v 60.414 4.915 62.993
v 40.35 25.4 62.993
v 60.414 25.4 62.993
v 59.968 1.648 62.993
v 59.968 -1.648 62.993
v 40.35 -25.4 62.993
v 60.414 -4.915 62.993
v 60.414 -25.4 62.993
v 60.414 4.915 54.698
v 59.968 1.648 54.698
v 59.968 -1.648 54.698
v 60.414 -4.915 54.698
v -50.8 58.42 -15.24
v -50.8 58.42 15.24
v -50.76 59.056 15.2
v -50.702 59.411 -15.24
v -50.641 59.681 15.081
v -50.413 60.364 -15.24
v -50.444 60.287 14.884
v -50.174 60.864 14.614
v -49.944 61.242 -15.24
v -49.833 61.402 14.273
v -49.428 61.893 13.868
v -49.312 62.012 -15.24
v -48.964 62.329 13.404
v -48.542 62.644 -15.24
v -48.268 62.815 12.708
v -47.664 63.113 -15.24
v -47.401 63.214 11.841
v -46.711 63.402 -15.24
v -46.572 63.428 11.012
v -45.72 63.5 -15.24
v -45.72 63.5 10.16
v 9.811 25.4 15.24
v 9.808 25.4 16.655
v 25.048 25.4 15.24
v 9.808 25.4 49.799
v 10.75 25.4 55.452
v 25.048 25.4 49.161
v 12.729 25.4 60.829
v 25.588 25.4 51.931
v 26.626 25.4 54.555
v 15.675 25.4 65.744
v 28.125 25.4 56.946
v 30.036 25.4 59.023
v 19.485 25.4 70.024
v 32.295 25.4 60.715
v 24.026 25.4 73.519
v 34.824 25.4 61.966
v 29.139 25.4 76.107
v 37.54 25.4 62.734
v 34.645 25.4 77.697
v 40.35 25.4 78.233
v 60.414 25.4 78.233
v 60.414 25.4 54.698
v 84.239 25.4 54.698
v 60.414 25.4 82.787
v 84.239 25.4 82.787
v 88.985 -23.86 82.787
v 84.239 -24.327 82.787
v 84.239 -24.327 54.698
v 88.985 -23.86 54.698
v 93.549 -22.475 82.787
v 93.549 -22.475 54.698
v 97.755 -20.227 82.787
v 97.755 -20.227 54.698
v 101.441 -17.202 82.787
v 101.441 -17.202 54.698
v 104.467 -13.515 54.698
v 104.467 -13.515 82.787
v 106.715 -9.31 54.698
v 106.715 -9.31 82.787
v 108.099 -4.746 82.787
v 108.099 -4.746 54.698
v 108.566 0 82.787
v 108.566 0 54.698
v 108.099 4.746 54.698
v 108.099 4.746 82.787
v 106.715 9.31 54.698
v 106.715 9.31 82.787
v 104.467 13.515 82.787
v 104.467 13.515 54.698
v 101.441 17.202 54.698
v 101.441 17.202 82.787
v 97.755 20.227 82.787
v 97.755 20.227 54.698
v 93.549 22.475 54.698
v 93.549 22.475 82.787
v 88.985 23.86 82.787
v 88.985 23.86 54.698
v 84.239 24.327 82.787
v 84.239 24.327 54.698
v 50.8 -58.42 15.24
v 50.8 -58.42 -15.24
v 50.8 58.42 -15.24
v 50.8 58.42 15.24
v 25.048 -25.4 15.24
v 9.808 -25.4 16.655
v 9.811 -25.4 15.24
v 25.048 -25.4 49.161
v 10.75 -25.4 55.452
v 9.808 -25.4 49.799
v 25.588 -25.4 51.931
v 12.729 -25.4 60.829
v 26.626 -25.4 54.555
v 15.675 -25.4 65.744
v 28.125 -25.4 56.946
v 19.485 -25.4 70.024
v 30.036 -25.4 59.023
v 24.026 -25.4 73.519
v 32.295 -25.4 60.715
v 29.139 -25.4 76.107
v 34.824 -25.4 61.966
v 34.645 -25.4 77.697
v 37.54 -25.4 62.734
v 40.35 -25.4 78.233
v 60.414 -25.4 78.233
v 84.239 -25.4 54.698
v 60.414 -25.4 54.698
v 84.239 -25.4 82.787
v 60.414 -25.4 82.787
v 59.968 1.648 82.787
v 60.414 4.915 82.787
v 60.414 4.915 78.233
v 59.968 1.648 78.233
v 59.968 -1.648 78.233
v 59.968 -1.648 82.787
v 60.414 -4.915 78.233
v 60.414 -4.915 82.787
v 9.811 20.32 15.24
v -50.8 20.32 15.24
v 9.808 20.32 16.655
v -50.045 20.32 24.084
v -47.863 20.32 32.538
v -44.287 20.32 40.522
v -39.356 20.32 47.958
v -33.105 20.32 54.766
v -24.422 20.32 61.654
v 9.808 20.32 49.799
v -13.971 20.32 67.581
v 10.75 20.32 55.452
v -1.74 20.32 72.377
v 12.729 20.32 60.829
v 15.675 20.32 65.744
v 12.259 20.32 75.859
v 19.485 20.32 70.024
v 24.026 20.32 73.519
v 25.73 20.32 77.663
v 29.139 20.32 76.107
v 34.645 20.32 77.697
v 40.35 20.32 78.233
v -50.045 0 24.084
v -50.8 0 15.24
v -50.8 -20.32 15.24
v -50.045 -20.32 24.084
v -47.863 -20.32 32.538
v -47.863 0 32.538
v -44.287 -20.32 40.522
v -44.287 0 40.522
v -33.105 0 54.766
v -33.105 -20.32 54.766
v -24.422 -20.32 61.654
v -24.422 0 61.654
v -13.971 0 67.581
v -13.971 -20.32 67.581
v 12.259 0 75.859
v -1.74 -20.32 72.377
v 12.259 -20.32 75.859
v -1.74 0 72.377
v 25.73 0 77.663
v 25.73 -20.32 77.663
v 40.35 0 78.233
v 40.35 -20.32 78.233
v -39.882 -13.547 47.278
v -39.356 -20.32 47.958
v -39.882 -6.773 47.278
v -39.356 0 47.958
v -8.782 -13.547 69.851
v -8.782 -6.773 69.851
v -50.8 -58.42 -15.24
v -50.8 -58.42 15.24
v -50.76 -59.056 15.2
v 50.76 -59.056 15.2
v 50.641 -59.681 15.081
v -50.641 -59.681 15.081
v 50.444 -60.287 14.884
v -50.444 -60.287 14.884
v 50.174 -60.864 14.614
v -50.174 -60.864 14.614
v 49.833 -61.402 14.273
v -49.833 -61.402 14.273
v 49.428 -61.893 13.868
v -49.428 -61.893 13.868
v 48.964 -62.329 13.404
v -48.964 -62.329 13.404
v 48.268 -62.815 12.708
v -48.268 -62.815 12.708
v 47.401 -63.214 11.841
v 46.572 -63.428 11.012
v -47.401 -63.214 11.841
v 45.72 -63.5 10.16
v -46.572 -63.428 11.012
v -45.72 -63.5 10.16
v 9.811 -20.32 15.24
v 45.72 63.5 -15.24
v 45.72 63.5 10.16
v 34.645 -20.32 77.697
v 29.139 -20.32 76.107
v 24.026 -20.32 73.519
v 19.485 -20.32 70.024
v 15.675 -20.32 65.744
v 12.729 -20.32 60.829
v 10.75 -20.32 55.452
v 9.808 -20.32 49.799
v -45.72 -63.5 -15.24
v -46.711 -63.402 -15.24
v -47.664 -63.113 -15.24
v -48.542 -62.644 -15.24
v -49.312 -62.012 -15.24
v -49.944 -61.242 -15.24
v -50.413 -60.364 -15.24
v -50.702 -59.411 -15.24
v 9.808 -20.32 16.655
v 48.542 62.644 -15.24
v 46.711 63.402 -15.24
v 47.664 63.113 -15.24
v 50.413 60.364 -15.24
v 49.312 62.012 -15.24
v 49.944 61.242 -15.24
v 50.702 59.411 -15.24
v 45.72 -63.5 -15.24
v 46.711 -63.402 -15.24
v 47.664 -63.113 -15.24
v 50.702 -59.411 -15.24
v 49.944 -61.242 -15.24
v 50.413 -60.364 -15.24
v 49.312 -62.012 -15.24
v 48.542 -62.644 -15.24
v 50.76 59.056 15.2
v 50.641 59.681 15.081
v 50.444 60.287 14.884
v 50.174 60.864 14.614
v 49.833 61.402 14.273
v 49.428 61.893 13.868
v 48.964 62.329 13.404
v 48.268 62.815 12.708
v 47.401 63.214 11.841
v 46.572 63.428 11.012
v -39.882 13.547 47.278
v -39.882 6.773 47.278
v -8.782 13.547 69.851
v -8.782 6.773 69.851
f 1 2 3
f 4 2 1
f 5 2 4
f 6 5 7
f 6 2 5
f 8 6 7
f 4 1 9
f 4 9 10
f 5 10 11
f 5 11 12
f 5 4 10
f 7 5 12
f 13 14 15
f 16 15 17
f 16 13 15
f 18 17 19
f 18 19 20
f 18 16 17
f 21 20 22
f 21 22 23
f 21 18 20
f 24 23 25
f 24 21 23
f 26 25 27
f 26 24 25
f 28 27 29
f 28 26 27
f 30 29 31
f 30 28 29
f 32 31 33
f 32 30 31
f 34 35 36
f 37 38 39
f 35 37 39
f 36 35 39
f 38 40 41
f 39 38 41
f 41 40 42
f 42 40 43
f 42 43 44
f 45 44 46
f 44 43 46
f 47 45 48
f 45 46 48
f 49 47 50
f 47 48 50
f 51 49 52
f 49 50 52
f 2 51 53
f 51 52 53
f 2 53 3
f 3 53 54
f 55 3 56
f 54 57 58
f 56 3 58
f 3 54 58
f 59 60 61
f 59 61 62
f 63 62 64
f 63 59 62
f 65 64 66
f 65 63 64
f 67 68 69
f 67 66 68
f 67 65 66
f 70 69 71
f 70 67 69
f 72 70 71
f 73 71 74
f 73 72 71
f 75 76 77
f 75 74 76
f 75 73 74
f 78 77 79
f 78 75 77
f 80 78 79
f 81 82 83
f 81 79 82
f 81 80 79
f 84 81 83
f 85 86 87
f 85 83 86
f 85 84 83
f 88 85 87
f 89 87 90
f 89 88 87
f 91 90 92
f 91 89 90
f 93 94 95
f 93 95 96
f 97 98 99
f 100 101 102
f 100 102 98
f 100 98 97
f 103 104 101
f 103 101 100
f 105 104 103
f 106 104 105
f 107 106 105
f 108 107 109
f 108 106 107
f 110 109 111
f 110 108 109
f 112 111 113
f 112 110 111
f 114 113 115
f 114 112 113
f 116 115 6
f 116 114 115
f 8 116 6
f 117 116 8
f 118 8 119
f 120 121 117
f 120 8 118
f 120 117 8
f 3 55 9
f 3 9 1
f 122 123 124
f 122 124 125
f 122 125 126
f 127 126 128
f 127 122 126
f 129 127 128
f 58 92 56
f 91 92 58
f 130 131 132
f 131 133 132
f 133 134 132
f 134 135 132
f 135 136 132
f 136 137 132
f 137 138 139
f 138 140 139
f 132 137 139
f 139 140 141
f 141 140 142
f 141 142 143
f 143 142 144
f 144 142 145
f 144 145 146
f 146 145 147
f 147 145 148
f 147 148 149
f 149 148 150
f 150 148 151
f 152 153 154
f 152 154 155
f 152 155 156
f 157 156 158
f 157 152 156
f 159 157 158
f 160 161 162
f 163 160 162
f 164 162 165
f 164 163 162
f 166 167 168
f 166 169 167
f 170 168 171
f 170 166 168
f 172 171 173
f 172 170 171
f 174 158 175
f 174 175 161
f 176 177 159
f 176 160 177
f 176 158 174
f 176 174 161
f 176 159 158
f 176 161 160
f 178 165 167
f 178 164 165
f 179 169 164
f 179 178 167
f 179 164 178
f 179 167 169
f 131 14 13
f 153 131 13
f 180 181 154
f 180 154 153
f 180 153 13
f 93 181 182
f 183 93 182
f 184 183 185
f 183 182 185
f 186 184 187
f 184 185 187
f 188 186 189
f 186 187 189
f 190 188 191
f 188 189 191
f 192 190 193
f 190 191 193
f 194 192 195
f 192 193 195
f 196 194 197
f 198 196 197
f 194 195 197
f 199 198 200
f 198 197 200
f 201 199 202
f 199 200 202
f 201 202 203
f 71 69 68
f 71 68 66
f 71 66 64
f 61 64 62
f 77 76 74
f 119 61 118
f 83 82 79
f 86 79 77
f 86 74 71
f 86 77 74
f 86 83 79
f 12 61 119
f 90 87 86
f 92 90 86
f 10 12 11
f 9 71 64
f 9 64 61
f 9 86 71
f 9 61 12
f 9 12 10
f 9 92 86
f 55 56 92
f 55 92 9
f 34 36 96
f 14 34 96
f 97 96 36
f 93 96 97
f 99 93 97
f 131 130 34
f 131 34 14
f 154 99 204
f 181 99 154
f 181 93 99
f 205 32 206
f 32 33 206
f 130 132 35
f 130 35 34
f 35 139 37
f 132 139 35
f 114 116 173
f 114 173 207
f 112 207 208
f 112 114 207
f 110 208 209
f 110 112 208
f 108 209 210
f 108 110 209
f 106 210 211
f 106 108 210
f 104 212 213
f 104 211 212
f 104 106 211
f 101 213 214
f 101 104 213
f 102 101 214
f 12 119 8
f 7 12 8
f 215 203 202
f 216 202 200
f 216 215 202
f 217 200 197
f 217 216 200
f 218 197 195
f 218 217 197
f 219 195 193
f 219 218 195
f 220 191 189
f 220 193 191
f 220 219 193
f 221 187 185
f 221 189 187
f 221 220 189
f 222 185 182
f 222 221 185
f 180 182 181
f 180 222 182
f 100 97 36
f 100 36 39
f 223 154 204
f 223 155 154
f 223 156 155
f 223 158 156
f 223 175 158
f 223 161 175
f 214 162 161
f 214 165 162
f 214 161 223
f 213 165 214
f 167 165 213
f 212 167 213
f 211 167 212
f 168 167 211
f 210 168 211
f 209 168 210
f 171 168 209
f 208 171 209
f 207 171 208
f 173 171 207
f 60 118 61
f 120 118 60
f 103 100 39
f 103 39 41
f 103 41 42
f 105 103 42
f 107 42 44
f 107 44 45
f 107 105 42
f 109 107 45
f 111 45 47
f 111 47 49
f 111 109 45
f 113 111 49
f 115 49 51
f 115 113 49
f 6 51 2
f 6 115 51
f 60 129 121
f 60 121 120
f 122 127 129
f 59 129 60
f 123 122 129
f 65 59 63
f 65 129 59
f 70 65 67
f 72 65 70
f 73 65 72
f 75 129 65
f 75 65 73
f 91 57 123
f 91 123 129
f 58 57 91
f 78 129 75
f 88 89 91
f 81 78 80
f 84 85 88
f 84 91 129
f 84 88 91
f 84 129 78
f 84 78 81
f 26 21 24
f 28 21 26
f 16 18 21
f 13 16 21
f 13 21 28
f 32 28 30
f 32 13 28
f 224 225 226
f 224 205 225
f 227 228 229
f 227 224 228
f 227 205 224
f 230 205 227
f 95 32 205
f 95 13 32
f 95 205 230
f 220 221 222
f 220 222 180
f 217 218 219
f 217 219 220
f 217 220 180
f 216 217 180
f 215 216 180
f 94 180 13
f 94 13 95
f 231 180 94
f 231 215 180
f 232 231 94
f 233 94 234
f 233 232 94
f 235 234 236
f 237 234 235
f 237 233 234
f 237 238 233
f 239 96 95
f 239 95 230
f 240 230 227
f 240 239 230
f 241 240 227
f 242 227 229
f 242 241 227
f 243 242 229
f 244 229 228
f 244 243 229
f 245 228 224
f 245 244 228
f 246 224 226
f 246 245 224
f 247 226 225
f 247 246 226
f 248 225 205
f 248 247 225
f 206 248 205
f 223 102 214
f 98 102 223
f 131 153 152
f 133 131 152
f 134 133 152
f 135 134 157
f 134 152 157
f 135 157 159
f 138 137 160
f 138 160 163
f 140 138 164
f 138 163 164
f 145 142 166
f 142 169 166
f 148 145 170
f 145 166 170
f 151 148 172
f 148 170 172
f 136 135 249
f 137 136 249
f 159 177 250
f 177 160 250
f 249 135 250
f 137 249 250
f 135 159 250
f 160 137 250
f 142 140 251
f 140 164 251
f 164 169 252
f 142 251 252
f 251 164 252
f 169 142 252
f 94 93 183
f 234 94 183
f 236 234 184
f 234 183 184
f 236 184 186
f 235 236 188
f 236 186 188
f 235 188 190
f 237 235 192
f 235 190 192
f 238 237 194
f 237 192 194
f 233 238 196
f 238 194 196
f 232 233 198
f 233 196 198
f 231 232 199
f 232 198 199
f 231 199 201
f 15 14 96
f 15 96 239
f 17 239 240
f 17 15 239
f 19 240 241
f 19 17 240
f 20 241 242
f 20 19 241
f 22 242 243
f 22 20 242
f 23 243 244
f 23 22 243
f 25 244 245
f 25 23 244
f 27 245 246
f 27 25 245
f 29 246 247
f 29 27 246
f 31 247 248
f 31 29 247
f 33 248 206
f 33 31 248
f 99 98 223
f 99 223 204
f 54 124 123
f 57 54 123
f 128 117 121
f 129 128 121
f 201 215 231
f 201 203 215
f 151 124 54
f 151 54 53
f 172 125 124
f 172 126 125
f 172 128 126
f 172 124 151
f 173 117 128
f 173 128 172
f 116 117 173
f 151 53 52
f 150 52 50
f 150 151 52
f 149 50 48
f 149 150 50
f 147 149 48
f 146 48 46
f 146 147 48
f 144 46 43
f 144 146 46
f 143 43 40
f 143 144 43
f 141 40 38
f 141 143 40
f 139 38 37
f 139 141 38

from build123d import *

# Parameters (mm, degrees)
F1_DEPTH = 63.5
F2_R     = 5.08
F0_W     = 23.8256007433
F0_H     = 15.24
F0_H_2   = 4.5536607504
F0_H_3   = 8.295490036
F3_DEPTH = 25.4
F4_DEPTH = 20.32


with BuildPart() as f1:
    # F0 (on Front) → F1 (new body, symmetric)
    with BuildSketch(Plane.XZ):
        Polygon((50.8, 15.24), (25.0475049125, 15.24), (9.811083613, 15.24), (-50.8, 15.24), (-50.8, -15.24), (50.8, -15.24), align=None)
    extrude(amount=F1_DEPTH, both=True)

    # F2
    f2_edges = [f1.edges().sort_by_distance(p)[0] for p in [
        (0, -63.5, 15.24),
        (50.8, -63.5, 0),
        (50.8, 63.5, 0),
        (-50.8, -63.5, 0),
        (-50.8, 63.5, 0),
        (0, 63.5, 15.24),
    ]]
    fillet(f2_edges, radius=F2_R)

    # F0 (on Front) → F3 (join, symmetric)
    with BuildSketch(Plane.XZ):
        with BuildLine():
            Line((9.811083613, 15.24), (25.0475049125, 15.24))
            Line((25.0475049125, 15.24), (25.0475049125, 49.1612727198))
            ThreePointArc((25.0475049125, 49.1612727198), (30.0363393946, 59.0226161714), (40.349945426, 62.9930185175))
            Line((40.349945426, 62.9930185175), (60.413621366, 62.9930185175))
            Line((60.413621366, 62.9930185175), (60.413621366, 78.2330185175))
            Line((60.413621366, 78.2330185175), (40.349945426, 78.2330185175))
            ThreePointArc((40.349945426, 78.2330185175), (19.4853705585, 70.0242707851), (9.8075049125, 49.7992135472))
            Line((9.8075049125, 49.7992135472), (9.8075049125, 16.6551610548))
            Line((9.8075049125, 16.6551610548), (9.811083613, 15.24))
        make_face()
        with Locations((72.3264217377, 70.6130185175)):
            Rectangle(F0_W, F0_H)
        with Locations((72.3264217377, 80.5098488927)):
            Rectangle(F0_W, F0_H_2)
        with Locations((72.3264217377, 58.8452734995)):
            Rectangle(F0_W, F0_H_3)
    extrude(amount=F3_DEPTH, both=True)

    # F0 (on Front) → F4 (join, symmetric)
    with BuildSketch(Plane.XZ):
        with BuildLine():
            Line((-50.8, 15.24), (9.811083613, 15.24))
            Line((9.811083613, 15.24), (9.8075049125, 16.6551610548))
            Line((9.8075049125, 16.6551610548), (9.8075049125, 49.7992135472))
            ThreePointArc((9.8075049125, 49.7992135472), (19.4853705585, 70.0242707851), (40.349945426, 78.2330185175))
            add(Edge.make_bspline(
                [(-50.8, 15.24), (-50.6889559329, 50.4340007901), (-17.0823093504, 78.5231366754), (40.349945426, 78.2330185175)],
                knots=[0, 0, 0, 0, 110.7990655787, 110.7990655787, 110.7990655787, 110.7990655787], degree=3))
        make_face()
    extrude(amount=F4_DEPTH, both=True)

    # F0 (on Front) → F5 (revolve)
    with BuildSketch(Plane.XZ):
        Polygon((84.2392221093, 78.2330185175), (84.2392221093, 62.9930185175), (84.2392221093, 54.6975284815), (108.5664257407, 54.6975284815), (108.5664257407, 82.7866792679), (84.2392221093, 82.7866792679), align=None)
    revolve(axis=Axis((84.2392221093, 0, 68.7421038747), (0, 0, 1)))


solid = f1.part
